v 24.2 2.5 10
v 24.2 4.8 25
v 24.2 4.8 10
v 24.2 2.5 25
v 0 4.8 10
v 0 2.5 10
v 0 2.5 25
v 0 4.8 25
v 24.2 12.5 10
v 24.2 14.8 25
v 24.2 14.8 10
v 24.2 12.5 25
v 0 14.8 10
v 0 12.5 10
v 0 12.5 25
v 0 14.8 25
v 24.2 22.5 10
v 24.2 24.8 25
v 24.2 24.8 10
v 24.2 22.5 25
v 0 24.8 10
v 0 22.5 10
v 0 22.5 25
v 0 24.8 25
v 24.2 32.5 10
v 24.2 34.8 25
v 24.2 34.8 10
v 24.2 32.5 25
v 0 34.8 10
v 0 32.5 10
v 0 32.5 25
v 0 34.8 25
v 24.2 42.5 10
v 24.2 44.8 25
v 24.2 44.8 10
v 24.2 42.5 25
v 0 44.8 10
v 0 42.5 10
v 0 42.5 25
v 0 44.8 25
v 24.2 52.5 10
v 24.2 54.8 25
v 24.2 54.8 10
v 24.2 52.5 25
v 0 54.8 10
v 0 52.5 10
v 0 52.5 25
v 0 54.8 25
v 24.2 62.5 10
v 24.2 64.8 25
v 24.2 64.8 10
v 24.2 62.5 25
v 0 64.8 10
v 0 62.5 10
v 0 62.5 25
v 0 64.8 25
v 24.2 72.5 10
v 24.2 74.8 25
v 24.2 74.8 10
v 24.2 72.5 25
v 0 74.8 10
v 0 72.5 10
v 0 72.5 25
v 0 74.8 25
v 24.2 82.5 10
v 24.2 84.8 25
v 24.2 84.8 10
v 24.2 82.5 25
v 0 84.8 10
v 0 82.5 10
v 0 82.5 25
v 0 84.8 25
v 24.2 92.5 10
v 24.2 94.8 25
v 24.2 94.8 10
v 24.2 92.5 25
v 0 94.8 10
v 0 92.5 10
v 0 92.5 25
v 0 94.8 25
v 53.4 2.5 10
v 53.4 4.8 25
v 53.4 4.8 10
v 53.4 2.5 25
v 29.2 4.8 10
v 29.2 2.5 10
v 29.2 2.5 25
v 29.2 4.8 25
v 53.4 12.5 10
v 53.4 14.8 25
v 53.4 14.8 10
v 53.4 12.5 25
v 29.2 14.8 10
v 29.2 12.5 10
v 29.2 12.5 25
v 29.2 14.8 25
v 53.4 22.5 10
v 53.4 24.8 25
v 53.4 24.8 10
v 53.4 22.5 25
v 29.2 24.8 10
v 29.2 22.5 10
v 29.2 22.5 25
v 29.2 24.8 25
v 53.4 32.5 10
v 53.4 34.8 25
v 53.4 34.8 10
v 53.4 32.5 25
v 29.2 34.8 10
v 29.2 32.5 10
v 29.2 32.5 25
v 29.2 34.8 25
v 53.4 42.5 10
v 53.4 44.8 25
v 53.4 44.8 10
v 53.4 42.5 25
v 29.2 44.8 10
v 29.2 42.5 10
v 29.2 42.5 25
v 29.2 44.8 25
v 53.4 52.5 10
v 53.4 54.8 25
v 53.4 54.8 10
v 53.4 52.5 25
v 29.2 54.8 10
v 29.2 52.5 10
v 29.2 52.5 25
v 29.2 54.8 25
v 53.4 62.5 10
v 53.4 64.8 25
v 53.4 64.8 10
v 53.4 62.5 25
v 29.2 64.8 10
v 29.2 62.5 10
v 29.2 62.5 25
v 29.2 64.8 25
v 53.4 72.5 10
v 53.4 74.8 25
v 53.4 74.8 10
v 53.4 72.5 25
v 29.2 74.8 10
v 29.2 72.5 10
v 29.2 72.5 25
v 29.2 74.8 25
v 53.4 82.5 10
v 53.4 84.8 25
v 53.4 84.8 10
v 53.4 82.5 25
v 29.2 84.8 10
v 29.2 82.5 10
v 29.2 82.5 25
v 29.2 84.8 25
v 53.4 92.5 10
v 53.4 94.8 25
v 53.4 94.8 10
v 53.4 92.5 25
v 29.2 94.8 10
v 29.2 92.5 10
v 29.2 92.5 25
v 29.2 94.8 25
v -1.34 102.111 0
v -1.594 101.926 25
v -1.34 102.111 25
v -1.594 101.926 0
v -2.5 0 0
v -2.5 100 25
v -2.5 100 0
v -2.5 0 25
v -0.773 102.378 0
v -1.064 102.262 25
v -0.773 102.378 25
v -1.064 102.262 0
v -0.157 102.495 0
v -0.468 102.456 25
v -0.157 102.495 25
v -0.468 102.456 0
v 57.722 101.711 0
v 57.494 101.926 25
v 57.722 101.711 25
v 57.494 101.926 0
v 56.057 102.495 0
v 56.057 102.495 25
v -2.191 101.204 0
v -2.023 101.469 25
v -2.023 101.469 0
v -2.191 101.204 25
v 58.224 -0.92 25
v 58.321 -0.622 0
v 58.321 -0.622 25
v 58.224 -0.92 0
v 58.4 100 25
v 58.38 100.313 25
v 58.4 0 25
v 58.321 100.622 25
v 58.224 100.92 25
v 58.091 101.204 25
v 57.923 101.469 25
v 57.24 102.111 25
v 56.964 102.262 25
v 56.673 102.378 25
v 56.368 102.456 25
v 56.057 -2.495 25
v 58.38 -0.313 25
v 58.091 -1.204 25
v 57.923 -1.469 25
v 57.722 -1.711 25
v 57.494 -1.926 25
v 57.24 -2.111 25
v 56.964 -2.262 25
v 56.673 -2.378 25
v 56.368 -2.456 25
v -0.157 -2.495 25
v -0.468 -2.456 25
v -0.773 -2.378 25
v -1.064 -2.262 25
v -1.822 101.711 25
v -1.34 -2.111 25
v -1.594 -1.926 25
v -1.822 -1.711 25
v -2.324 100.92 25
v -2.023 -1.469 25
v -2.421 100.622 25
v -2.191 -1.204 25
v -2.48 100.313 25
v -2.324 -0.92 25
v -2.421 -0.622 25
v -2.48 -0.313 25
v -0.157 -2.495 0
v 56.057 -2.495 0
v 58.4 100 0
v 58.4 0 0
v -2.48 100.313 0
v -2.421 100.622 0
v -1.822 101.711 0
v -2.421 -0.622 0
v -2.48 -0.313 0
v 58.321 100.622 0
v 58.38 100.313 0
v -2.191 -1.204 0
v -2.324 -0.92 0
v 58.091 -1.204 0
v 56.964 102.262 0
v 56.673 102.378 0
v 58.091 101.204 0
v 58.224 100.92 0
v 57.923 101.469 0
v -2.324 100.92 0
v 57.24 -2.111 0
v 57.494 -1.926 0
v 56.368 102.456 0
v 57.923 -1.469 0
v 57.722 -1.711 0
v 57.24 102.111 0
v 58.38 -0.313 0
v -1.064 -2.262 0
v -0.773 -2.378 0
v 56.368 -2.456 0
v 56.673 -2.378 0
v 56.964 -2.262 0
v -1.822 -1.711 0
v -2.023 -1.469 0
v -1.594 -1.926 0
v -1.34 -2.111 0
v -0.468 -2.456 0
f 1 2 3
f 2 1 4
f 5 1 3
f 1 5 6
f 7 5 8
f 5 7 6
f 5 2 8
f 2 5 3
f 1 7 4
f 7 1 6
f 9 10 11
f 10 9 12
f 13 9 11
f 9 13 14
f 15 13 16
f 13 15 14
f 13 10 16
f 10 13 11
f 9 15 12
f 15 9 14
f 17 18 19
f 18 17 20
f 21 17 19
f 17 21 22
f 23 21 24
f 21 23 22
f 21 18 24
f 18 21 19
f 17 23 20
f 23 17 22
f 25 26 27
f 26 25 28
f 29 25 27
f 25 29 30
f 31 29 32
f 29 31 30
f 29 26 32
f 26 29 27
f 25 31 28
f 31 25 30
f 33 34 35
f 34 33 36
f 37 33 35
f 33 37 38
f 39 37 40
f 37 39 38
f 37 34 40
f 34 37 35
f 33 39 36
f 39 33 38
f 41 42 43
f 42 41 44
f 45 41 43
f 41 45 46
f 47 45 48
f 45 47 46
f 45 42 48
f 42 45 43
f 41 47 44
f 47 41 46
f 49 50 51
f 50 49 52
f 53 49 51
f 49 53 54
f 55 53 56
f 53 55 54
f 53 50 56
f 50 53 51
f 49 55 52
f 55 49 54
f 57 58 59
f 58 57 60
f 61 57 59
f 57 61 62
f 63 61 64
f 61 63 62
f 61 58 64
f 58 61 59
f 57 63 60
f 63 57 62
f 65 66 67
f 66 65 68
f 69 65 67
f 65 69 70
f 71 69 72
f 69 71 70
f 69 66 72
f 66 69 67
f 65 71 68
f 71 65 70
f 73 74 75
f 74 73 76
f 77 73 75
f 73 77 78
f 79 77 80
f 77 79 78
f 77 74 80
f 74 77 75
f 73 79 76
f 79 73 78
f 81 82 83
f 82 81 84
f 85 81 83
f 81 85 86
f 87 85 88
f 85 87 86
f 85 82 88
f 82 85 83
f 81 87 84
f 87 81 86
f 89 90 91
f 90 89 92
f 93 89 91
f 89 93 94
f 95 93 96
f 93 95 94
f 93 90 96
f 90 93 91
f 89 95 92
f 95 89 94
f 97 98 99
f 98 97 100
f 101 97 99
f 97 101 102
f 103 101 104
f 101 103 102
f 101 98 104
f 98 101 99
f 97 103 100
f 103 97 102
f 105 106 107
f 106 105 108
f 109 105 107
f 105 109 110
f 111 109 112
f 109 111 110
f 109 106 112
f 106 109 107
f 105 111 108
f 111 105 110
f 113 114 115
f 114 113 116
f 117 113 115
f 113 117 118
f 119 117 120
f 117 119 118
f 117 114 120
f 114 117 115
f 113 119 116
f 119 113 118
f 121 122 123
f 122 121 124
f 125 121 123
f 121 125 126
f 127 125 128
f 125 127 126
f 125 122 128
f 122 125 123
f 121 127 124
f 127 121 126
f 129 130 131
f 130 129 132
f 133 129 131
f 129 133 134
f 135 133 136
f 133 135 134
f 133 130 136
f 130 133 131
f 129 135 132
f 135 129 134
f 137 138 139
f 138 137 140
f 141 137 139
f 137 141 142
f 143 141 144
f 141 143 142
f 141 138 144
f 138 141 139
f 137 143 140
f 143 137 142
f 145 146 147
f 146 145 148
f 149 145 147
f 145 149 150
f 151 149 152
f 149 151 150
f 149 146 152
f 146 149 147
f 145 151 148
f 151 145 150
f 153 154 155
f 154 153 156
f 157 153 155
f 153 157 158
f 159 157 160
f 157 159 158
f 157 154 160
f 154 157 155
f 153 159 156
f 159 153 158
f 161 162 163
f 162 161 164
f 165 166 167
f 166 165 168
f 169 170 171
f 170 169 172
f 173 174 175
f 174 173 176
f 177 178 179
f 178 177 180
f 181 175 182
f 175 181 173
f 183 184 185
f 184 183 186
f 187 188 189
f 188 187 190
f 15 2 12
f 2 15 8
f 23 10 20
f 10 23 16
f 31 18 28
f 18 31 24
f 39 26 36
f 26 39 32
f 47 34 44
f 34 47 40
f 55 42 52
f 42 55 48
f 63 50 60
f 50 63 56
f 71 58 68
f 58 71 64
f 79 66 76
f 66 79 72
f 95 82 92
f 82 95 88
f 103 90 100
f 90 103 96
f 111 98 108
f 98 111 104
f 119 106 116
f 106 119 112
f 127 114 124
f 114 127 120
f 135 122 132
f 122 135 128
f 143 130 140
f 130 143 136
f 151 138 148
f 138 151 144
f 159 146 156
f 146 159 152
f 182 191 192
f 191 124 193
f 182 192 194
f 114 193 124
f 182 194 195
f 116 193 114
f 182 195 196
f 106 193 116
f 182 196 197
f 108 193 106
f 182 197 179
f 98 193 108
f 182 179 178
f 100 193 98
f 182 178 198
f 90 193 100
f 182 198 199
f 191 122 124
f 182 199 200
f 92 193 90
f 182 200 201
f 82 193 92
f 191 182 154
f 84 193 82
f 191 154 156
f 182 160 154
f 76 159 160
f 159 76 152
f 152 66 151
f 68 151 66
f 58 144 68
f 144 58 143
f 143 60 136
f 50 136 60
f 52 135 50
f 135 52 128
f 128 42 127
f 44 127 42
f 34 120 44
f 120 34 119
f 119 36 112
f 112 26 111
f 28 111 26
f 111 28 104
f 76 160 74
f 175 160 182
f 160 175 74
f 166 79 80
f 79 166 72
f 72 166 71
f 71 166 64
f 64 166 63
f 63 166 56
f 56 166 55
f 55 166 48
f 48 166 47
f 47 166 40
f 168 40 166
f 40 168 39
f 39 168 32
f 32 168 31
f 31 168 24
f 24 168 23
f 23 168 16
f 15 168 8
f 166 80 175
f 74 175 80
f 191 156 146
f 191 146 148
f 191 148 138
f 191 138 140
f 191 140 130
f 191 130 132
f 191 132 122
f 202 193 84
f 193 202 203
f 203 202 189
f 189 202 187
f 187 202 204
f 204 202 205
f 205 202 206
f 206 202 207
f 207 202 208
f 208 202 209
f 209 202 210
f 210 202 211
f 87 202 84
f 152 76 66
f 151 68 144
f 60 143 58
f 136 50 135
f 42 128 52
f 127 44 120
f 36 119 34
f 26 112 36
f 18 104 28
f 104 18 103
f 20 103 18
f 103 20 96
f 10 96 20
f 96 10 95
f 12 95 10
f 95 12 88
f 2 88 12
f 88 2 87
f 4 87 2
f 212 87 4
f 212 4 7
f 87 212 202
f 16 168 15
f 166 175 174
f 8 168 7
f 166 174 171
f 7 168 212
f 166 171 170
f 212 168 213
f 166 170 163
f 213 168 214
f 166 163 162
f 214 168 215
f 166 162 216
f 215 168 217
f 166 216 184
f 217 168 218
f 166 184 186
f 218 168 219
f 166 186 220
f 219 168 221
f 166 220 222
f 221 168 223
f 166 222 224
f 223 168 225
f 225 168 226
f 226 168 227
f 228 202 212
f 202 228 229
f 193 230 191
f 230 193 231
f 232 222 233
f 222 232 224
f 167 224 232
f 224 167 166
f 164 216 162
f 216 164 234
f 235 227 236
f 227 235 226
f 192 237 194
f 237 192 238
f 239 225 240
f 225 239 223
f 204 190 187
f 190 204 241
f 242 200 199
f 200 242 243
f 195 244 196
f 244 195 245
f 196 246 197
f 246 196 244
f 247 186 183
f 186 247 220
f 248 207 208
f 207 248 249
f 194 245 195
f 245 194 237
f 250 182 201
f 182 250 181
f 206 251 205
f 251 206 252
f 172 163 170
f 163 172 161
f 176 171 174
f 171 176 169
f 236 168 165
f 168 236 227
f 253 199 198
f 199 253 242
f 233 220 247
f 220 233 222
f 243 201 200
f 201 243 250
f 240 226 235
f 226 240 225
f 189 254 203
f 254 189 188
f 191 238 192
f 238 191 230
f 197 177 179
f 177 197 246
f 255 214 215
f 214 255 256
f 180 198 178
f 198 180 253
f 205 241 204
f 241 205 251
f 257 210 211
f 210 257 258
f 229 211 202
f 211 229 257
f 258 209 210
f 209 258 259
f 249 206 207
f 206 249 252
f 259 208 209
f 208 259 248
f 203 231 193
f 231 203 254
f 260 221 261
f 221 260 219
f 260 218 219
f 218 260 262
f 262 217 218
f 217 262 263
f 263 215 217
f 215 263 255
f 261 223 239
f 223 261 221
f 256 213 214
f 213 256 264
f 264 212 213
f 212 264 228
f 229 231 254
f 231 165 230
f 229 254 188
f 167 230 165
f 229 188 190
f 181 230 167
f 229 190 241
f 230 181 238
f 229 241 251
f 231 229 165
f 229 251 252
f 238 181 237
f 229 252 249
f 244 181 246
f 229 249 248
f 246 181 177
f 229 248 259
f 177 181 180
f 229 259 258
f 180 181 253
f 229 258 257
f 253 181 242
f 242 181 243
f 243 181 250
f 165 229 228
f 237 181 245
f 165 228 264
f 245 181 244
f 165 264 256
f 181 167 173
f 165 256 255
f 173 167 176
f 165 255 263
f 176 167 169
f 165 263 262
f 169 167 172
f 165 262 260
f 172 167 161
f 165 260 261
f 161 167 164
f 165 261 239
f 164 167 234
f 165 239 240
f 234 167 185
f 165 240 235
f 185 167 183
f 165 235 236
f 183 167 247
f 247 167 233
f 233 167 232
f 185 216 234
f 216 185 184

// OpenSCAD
/*
copyright 2016 überhack

Customizable SD card holder by uberhack is licensed under the Attribution - Non-Commercial - Share Alike license.

Have fun =)
*/

rows = 2;
cols = 10;
height = 25;
radius = 2.5;
tolerance = 0.2;

$fn=50/1;

// card size 32.0 × 24.0 × 2.1 mm
sd_card_holder();


module sd_card_holder(){
cardx = 24;
cardy = 2.1;
cardz = 32;

    difference(){
        hull(){
            cylinder(r=radius, h=height);
            translate([0,cols*10,0])
            cylinder(r=radius, h=height);
            translate([rows*(radius*2+cardx+tolerance)-radius,cols*10,0])
            cylinder(r=radius, h=height);
            translate([rows*(radius*2+cardx+tolerance)-radius,0,0])
            cylinder(r=radius, h=height);
        }

        for (r = [0:1:rows-1]){
            for (c = [0:1:cols-1]){
                translate([r*(radius*2+cardx+tolerance),radius+(c*10),10])
                cube([cardx+tolerance,cardy+tolerance,cardz+tolerance]);
            }
        }
    }
}
